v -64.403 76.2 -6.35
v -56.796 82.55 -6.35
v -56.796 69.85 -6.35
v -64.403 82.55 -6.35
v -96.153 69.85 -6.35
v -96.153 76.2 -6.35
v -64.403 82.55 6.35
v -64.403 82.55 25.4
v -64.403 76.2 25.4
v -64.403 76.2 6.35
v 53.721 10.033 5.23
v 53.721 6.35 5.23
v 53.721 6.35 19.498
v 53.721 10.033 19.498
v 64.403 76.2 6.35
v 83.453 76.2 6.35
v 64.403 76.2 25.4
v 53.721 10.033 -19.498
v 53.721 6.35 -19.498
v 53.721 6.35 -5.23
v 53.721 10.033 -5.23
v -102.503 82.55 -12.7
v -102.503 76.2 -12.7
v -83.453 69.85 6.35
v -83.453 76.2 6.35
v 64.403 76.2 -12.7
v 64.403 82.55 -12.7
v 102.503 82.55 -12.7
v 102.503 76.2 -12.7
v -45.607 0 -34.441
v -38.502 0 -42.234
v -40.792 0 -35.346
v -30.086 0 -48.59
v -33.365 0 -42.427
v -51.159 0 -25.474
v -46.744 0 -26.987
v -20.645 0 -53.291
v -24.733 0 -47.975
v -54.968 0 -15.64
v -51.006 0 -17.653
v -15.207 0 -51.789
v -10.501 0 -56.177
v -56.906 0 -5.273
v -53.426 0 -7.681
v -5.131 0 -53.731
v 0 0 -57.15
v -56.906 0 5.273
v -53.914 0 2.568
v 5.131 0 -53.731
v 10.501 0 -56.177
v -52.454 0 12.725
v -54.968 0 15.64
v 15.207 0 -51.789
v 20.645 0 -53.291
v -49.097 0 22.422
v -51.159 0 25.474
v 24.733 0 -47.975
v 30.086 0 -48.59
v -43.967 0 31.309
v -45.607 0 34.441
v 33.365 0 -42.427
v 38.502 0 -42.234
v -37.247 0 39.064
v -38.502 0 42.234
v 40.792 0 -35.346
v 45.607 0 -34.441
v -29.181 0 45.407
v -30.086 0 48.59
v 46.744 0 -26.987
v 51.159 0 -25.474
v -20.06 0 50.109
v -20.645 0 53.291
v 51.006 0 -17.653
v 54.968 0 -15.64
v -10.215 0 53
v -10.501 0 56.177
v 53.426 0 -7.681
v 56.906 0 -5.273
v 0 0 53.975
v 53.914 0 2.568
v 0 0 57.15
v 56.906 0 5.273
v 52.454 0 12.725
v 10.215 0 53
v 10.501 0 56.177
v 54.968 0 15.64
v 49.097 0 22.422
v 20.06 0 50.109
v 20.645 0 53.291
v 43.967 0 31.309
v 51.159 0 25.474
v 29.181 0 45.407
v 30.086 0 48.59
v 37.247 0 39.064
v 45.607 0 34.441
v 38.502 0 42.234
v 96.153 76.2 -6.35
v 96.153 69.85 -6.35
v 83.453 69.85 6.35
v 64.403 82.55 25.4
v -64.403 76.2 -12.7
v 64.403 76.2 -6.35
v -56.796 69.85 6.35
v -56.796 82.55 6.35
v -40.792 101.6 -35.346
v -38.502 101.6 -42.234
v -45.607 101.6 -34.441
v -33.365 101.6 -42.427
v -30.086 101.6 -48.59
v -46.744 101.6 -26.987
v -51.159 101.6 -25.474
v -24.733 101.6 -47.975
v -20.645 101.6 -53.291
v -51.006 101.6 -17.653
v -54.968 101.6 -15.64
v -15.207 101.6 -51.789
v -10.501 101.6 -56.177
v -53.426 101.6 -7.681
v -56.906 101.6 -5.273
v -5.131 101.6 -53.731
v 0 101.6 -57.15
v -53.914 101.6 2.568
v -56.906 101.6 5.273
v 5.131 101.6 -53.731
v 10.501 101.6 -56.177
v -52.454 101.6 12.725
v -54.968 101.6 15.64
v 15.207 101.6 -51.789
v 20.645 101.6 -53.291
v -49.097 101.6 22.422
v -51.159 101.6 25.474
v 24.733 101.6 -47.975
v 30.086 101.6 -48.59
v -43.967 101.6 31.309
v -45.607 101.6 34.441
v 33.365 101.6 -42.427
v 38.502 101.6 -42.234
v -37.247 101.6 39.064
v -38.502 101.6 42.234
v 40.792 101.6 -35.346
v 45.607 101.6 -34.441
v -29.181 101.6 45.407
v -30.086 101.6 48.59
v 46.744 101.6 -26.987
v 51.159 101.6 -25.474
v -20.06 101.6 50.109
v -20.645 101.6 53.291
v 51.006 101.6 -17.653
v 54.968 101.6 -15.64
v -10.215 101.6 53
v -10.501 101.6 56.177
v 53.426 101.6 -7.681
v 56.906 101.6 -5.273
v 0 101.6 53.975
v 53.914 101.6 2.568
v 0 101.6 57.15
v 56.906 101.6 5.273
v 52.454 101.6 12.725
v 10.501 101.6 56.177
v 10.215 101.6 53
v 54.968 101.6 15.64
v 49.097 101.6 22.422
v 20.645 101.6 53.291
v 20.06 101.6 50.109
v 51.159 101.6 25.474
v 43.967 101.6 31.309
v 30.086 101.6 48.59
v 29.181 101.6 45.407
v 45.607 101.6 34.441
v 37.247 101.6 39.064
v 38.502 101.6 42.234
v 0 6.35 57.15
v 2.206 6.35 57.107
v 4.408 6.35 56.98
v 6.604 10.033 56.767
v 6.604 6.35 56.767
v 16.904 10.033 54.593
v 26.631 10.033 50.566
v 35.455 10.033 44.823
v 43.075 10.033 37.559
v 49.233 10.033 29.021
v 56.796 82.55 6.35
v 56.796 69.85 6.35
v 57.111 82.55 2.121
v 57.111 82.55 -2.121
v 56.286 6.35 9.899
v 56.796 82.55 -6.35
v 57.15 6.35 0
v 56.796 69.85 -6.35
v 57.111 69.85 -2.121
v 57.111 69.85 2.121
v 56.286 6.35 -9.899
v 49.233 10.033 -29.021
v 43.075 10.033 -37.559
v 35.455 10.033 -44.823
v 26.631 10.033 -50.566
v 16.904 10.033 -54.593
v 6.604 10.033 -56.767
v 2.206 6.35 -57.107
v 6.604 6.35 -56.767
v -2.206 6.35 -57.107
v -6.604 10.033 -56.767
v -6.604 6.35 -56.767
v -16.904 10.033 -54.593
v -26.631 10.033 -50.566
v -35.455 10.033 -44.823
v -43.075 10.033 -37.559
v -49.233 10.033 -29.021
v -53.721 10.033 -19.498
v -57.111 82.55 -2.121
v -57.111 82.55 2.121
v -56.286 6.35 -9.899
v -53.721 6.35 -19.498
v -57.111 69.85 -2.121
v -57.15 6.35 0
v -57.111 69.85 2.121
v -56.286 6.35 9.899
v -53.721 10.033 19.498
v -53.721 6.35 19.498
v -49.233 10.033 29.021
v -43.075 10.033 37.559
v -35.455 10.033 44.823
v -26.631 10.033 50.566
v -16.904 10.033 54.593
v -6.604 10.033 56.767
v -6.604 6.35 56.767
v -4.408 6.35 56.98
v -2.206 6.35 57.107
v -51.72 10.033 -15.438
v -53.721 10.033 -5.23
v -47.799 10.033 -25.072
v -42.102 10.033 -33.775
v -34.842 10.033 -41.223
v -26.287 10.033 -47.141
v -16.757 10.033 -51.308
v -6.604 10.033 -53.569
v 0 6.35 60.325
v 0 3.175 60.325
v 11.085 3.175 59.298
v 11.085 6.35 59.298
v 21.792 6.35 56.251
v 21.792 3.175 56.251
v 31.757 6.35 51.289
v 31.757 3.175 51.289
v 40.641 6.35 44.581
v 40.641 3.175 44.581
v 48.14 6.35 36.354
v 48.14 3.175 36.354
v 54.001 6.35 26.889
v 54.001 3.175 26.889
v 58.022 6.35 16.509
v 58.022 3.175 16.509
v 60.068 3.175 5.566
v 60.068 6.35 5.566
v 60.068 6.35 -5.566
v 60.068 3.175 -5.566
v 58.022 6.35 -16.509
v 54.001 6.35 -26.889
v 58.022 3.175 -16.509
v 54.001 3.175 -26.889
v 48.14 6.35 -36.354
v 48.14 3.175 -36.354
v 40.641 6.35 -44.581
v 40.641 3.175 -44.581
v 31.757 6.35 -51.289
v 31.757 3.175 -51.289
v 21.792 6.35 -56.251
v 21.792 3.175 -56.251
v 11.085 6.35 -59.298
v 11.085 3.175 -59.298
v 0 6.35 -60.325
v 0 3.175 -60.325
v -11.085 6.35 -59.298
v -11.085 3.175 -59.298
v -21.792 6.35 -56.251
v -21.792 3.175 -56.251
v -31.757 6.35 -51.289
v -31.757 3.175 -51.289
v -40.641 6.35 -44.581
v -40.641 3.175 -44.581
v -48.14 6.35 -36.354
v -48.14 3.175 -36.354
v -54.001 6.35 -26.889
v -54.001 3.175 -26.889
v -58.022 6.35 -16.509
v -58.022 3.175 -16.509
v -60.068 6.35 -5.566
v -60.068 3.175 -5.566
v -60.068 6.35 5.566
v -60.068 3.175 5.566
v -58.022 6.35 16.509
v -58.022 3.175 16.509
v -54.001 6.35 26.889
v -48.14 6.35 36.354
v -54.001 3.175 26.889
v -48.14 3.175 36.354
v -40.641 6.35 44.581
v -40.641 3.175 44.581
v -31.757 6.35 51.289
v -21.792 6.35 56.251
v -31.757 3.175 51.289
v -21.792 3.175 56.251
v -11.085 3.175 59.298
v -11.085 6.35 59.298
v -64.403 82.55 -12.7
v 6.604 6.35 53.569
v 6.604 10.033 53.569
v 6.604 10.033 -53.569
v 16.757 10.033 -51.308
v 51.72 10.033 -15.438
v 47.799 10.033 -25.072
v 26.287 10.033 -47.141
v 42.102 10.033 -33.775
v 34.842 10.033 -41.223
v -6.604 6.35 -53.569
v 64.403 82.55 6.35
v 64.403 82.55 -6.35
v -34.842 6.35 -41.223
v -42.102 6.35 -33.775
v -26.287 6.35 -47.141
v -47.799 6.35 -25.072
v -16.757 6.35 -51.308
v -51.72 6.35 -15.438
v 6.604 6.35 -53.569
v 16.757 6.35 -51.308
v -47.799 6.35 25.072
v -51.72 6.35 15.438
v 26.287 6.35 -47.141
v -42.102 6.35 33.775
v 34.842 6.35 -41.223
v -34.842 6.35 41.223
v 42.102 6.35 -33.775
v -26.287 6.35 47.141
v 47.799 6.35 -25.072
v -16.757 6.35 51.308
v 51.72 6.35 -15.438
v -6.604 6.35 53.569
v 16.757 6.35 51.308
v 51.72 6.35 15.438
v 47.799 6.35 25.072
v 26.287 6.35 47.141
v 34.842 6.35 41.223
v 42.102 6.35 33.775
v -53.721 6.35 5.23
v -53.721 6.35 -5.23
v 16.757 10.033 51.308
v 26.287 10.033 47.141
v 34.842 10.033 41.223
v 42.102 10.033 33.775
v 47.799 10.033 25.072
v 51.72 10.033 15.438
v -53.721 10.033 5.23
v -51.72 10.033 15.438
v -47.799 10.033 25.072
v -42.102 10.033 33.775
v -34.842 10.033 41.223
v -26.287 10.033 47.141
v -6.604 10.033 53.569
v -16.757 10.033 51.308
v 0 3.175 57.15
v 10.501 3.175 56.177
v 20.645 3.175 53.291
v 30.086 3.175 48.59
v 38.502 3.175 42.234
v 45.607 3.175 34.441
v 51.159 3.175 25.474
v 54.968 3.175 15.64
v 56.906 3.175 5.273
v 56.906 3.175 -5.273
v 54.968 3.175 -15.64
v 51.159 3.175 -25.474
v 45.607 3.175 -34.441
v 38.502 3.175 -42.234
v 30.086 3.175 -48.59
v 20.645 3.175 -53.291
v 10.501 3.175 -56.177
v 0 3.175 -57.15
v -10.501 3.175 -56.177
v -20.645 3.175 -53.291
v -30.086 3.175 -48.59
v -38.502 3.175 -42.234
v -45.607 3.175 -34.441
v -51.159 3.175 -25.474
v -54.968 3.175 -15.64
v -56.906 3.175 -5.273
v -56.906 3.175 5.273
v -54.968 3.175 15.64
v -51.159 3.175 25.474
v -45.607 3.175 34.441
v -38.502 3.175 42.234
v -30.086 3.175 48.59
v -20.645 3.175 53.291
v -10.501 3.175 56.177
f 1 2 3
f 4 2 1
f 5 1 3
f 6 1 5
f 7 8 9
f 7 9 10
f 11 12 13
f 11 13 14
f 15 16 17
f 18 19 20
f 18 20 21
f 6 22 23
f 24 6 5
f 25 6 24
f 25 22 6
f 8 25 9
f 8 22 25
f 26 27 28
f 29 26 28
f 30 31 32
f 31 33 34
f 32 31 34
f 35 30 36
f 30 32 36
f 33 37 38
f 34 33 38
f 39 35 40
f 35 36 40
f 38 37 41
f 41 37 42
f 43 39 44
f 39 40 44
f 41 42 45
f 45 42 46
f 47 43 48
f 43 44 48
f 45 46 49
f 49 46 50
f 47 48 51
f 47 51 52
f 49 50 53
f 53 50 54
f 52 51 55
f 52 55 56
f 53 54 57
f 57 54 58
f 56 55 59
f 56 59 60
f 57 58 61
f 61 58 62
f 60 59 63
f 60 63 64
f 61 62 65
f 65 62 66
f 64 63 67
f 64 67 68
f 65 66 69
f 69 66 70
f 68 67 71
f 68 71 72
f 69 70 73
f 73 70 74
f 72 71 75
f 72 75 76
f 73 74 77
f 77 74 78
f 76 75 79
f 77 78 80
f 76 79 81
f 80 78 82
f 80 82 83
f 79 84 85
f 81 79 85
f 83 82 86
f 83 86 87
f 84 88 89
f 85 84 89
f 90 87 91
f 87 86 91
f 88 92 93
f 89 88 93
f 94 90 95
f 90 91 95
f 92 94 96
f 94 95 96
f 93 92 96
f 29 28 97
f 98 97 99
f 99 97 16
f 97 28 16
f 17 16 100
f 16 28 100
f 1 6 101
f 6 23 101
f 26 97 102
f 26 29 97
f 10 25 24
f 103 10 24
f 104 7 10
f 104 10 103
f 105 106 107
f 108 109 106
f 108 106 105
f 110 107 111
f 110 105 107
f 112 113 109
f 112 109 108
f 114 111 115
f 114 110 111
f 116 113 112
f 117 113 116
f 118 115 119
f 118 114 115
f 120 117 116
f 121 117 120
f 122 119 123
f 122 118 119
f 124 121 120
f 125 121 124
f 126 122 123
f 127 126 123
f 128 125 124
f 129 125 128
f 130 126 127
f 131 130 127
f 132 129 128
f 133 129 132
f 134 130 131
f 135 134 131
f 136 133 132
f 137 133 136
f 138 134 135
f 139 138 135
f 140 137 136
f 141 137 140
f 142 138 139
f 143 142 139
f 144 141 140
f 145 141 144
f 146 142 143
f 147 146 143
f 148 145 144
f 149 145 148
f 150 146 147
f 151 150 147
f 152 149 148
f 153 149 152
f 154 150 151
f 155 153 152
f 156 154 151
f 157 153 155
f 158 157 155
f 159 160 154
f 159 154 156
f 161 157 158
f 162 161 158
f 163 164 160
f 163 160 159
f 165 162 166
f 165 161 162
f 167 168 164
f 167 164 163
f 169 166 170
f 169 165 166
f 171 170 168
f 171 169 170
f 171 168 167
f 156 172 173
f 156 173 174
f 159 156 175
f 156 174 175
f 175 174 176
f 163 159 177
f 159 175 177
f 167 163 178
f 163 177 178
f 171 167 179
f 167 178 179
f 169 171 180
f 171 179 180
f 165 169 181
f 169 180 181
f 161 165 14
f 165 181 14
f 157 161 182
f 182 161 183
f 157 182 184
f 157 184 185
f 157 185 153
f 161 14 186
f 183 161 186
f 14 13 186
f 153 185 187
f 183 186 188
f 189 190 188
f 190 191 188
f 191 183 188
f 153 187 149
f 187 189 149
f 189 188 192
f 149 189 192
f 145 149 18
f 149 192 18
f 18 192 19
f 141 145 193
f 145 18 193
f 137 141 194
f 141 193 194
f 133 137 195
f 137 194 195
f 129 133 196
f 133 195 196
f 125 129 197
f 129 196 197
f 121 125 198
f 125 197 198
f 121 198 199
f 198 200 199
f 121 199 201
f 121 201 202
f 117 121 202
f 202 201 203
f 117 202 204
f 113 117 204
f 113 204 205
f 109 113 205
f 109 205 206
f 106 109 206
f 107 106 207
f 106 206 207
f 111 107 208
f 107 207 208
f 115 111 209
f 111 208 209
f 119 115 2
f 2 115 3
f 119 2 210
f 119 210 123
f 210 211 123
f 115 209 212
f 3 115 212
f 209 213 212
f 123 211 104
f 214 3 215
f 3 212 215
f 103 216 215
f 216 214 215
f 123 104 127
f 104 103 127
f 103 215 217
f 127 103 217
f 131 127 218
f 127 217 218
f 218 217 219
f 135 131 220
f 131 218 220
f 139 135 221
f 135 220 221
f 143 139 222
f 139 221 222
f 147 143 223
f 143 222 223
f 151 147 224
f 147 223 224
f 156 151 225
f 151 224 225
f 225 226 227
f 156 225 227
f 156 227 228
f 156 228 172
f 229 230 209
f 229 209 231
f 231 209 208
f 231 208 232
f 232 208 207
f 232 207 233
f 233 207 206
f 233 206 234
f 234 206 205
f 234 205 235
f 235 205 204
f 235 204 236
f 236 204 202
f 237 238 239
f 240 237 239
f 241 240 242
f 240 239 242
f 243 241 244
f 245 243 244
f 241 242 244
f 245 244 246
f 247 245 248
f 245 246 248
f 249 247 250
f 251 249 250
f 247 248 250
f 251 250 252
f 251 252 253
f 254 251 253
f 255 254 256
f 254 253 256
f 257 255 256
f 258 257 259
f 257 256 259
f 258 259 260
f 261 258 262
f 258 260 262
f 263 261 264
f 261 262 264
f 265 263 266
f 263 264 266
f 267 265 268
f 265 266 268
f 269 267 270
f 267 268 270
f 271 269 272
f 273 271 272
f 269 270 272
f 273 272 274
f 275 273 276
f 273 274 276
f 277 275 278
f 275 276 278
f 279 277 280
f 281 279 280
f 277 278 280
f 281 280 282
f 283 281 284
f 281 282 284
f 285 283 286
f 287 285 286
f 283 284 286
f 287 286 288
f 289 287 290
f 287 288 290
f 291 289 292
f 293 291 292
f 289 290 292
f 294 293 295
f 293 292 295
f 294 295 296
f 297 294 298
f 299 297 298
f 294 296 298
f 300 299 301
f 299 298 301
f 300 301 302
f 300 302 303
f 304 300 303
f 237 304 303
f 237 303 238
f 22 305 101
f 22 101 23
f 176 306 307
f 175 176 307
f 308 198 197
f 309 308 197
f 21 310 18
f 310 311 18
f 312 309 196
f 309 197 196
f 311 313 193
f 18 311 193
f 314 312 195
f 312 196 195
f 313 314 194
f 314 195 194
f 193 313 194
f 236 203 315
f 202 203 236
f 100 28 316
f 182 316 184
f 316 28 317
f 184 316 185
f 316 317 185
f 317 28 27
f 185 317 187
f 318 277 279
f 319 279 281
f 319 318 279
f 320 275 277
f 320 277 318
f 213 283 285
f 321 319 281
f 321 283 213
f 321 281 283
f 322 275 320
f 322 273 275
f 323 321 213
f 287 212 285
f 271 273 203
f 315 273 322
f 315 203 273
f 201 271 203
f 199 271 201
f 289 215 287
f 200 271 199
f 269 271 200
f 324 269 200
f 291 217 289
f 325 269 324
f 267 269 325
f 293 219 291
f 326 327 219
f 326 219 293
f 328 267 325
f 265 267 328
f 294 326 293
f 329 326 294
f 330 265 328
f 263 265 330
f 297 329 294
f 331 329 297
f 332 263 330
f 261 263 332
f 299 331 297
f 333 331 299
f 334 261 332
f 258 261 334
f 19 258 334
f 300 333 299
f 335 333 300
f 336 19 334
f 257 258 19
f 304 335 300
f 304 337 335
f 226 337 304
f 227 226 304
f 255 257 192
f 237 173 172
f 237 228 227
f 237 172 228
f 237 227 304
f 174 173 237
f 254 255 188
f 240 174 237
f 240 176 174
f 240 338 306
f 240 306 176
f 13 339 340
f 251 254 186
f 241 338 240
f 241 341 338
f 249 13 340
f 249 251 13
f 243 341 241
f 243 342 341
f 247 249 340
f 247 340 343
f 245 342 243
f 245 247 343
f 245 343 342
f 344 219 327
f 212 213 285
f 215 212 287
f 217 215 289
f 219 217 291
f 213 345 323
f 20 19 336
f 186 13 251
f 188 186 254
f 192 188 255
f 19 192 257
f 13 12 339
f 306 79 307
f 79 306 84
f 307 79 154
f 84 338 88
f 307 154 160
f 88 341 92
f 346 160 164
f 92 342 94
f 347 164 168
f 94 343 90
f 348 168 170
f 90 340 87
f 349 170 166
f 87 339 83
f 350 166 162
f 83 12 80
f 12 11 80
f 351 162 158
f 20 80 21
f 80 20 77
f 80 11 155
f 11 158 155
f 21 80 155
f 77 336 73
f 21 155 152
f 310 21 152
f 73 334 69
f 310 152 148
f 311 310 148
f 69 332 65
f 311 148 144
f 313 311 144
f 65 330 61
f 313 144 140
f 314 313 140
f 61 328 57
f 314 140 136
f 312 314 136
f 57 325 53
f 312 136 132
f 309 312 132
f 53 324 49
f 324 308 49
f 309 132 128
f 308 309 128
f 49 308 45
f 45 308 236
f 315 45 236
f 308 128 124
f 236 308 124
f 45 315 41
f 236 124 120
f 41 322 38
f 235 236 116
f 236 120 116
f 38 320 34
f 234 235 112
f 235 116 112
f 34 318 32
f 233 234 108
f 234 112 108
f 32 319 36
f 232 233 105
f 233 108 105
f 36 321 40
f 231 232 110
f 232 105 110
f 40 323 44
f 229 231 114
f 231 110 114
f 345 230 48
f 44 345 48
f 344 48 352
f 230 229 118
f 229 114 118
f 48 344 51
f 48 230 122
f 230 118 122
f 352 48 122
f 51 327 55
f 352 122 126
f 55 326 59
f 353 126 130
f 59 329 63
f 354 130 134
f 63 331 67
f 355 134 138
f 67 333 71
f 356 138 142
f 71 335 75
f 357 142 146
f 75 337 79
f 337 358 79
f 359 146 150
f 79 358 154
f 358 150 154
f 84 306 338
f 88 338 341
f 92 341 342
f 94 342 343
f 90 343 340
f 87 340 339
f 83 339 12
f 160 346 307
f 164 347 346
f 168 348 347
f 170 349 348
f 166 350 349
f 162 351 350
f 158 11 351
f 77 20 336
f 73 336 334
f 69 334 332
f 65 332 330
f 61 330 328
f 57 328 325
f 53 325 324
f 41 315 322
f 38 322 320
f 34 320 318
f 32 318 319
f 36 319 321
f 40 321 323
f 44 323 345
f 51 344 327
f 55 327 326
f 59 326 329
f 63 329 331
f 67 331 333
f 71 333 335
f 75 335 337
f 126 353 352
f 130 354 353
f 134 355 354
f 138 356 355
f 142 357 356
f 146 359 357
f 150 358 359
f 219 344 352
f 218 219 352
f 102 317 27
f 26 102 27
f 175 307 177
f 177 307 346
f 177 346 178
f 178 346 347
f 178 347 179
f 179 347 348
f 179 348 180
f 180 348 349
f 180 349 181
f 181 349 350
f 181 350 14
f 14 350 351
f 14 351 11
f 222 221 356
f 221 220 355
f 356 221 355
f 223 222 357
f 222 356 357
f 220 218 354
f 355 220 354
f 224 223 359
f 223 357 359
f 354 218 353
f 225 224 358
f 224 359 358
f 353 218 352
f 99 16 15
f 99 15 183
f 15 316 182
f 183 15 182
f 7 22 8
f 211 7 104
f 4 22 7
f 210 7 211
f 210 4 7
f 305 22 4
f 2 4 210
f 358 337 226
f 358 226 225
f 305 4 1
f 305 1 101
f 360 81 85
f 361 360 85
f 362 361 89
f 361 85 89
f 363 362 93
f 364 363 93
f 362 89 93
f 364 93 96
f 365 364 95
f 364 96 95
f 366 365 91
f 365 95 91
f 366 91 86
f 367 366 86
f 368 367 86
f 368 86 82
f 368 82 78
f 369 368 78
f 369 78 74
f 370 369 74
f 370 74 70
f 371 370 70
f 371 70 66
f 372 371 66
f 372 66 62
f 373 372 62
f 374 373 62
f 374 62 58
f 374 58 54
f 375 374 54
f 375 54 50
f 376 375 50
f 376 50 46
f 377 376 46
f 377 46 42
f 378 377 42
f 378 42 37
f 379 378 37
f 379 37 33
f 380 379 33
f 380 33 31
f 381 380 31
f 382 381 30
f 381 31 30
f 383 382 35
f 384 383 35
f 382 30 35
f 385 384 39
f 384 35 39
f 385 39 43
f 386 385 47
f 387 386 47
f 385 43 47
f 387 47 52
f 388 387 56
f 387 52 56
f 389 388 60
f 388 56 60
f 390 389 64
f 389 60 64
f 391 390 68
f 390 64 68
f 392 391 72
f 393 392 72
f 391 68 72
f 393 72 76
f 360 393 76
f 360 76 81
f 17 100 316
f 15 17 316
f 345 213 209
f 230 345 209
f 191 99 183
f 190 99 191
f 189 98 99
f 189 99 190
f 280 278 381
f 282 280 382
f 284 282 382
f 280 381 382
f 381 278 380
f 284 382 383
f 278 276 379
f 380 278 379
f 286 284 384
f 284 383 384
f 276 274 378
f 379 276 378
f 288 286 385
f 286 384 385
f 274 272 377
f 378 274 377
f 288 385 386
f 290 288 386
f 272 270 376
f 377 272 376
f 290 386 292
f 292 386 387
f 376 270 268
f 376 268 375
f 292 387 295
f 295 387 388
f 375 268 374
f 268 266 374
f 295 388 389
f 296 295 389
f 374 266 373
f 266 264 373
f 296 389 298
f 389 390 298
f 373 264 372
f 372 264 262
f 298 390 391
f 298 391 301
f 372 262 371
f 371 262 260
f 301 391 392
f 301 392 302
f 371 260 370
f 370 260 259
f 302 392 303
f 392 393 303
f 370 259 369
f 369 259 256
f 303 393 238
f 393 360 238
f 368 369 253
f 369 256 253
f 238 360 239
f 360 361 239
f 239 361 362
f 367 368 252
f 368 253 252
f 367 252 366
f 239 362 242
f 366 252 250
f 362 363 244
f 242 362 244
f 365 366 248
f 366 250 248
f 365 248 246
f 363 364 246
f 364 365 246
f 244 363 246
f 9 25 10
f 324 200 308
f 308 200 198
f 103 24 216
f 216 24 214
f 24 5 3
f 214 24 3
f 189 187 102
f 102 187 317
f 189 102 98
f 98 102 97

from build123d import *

# Parameters (mm, degrees)
SKETCH1_R               = 57.15
BOSS_EXTRUDE1_DEPTH     = 101.6
SKETCH2_R               = 53.975
CUT_EXTRUDE1_DEPTH      = 130.826056707
CUT_EXTRUDE4_DEPTH      = 130.826056707
CUT_EXTRUDE4_DEPTH_BACK = 130.826056707
SKETCH6_W               = 47.117
SKETCH6_H               = 3.683
BOSS_EXTRUDE7_START     = 3.175
SKETCH10_R              = 60.325
SKETCH10_R_2            = 57.15
BOSS_EXTRUDE7_DEPTH     = 3.175
BOSS_EXTRUDE6_START     = 12.7
BOSS_EXTRUDE6_DEPTH     = 12.7
BOSS_EXTRUDE8_DEPTH     = 6.35


with BuildPart() as part:
    # Sketch1 → Boss-Extrude1 (new body)
    with BuildSketch(Plane(origin=(0, 0, 0), x_dir=(1, 0, 0), z_dir=(0, 1, 0))):
        with Locations(Location((0, 0, 0), (0, 0, 270))):
            Circle(SKETCH1_R)
    extrude(amount=BOSS_EXTRUDE1_DEPTH)

    # Sketch2 → Cut-Extrude1 (cut, through all)
    with BuildSketch(Plane(origin=(0, 101.6, 0), x_dir=(1, 0, 0), z_dir=(0, 1, 0))):
        with Locations(Location((0, 0, 0), (0, 0, 270))):
            Circle(SKETCH2_R)
    extrude(amount=-CUT_EXTRUDE1_DEPTH, mode=Mode.SUBTRACT)

    # Sketch6 → Cut-Extrude4 (cut, two sides: drawn at the far end of the back side and taken through both)
    with BuildSketch(Plane.XY.offset(-CUT_EXTRUDE4_DEPTH_BACK)):
        with Locations((-30.1625, 8.1915)):
            Rectangle(SKETCH6_W, SKETCH6_H)
        with Locations((30.1625, 8.1915)):
            Rectangle(SKETCH6_W, SKETCH6_H)
    extrude(amount=CUT_EXTRUDE4_DEPTH + CUT_EXTRUDE4_DEPTH_BACK, mode=Mode.SUBTRACT)

    # Sketch10 → Boss-Extrude7 (add)
    with BuildSketch(Plane(origin=(0, 0, 0), x_dir=(1, 0, 0), z_dir=(0, 1, 0)).offset(BOSS_EXTRUDE7_START)):
        with Locations(Location((0, 0, 0), (0, 0, 270))):
            Circle(SKETCH10_R)
        with Locations(Location((0, 0, 0), (0, 0, 270))):
            Circle(SKETCH10_R_2, mode=Mode.SUBTRACT)
    extrude(amount=BOSS_EXTRUDE7_DEPTH)

    # Sketch9 → Boss-Extrude6 (add)
    with BuildSketch(Plane(origin=(0, 69.85, 0), x_dir=(1, 0, 0), z_dir=(0, 1, 0)).offset(BOSS_EXTRUDE6_START)):
        with BuildLine():
            Line((-83.4525636, -6.35), (-53.600169076, -6.35))
            ThreePointArc((-53.600169076, -6.35), (-53.975, 0), (-53.600169076, 6.35))
            Line((-53.600169076, 6.35), (-96.1525636, 6.35))
            Line((-96.1525636, 6.35), (-83.4525636, -6.35))
        make_face()
    boss_extrude6 = extrude(amount=-BOSS_EXTRUDE6_DEPTH)

    # Sketch11 → Boss-Extrude8 (add)
    with BuildSketch(Plane(origin=(0, 82.55, 0), x_dir=(1, 0, 0), z_dir=(0, 1, 0))):
        Polygon((-64.4025636, -25.4), (-64.4025636, 12.7), (-102.5025636, 12.7), align=None)
    boss_extrude8 = extrude(amount=-BOSS_EXTRUDE8_DEPTH)

    # Mirror1: Boss-Extrude6, Boss-Extrude8 across plane
    add(boss_extrude6.mirror(Plane(origin=(0, 0, 0), x_dir=(0, 0, 1), z_dir=(1, 0, 0))))
    add(boss_extrude8.mirror(Plane(origin=(0, 0, 0), x_dir=(0, 0, 1), z_dir=(1, 0, 0))))


solid = part.part
